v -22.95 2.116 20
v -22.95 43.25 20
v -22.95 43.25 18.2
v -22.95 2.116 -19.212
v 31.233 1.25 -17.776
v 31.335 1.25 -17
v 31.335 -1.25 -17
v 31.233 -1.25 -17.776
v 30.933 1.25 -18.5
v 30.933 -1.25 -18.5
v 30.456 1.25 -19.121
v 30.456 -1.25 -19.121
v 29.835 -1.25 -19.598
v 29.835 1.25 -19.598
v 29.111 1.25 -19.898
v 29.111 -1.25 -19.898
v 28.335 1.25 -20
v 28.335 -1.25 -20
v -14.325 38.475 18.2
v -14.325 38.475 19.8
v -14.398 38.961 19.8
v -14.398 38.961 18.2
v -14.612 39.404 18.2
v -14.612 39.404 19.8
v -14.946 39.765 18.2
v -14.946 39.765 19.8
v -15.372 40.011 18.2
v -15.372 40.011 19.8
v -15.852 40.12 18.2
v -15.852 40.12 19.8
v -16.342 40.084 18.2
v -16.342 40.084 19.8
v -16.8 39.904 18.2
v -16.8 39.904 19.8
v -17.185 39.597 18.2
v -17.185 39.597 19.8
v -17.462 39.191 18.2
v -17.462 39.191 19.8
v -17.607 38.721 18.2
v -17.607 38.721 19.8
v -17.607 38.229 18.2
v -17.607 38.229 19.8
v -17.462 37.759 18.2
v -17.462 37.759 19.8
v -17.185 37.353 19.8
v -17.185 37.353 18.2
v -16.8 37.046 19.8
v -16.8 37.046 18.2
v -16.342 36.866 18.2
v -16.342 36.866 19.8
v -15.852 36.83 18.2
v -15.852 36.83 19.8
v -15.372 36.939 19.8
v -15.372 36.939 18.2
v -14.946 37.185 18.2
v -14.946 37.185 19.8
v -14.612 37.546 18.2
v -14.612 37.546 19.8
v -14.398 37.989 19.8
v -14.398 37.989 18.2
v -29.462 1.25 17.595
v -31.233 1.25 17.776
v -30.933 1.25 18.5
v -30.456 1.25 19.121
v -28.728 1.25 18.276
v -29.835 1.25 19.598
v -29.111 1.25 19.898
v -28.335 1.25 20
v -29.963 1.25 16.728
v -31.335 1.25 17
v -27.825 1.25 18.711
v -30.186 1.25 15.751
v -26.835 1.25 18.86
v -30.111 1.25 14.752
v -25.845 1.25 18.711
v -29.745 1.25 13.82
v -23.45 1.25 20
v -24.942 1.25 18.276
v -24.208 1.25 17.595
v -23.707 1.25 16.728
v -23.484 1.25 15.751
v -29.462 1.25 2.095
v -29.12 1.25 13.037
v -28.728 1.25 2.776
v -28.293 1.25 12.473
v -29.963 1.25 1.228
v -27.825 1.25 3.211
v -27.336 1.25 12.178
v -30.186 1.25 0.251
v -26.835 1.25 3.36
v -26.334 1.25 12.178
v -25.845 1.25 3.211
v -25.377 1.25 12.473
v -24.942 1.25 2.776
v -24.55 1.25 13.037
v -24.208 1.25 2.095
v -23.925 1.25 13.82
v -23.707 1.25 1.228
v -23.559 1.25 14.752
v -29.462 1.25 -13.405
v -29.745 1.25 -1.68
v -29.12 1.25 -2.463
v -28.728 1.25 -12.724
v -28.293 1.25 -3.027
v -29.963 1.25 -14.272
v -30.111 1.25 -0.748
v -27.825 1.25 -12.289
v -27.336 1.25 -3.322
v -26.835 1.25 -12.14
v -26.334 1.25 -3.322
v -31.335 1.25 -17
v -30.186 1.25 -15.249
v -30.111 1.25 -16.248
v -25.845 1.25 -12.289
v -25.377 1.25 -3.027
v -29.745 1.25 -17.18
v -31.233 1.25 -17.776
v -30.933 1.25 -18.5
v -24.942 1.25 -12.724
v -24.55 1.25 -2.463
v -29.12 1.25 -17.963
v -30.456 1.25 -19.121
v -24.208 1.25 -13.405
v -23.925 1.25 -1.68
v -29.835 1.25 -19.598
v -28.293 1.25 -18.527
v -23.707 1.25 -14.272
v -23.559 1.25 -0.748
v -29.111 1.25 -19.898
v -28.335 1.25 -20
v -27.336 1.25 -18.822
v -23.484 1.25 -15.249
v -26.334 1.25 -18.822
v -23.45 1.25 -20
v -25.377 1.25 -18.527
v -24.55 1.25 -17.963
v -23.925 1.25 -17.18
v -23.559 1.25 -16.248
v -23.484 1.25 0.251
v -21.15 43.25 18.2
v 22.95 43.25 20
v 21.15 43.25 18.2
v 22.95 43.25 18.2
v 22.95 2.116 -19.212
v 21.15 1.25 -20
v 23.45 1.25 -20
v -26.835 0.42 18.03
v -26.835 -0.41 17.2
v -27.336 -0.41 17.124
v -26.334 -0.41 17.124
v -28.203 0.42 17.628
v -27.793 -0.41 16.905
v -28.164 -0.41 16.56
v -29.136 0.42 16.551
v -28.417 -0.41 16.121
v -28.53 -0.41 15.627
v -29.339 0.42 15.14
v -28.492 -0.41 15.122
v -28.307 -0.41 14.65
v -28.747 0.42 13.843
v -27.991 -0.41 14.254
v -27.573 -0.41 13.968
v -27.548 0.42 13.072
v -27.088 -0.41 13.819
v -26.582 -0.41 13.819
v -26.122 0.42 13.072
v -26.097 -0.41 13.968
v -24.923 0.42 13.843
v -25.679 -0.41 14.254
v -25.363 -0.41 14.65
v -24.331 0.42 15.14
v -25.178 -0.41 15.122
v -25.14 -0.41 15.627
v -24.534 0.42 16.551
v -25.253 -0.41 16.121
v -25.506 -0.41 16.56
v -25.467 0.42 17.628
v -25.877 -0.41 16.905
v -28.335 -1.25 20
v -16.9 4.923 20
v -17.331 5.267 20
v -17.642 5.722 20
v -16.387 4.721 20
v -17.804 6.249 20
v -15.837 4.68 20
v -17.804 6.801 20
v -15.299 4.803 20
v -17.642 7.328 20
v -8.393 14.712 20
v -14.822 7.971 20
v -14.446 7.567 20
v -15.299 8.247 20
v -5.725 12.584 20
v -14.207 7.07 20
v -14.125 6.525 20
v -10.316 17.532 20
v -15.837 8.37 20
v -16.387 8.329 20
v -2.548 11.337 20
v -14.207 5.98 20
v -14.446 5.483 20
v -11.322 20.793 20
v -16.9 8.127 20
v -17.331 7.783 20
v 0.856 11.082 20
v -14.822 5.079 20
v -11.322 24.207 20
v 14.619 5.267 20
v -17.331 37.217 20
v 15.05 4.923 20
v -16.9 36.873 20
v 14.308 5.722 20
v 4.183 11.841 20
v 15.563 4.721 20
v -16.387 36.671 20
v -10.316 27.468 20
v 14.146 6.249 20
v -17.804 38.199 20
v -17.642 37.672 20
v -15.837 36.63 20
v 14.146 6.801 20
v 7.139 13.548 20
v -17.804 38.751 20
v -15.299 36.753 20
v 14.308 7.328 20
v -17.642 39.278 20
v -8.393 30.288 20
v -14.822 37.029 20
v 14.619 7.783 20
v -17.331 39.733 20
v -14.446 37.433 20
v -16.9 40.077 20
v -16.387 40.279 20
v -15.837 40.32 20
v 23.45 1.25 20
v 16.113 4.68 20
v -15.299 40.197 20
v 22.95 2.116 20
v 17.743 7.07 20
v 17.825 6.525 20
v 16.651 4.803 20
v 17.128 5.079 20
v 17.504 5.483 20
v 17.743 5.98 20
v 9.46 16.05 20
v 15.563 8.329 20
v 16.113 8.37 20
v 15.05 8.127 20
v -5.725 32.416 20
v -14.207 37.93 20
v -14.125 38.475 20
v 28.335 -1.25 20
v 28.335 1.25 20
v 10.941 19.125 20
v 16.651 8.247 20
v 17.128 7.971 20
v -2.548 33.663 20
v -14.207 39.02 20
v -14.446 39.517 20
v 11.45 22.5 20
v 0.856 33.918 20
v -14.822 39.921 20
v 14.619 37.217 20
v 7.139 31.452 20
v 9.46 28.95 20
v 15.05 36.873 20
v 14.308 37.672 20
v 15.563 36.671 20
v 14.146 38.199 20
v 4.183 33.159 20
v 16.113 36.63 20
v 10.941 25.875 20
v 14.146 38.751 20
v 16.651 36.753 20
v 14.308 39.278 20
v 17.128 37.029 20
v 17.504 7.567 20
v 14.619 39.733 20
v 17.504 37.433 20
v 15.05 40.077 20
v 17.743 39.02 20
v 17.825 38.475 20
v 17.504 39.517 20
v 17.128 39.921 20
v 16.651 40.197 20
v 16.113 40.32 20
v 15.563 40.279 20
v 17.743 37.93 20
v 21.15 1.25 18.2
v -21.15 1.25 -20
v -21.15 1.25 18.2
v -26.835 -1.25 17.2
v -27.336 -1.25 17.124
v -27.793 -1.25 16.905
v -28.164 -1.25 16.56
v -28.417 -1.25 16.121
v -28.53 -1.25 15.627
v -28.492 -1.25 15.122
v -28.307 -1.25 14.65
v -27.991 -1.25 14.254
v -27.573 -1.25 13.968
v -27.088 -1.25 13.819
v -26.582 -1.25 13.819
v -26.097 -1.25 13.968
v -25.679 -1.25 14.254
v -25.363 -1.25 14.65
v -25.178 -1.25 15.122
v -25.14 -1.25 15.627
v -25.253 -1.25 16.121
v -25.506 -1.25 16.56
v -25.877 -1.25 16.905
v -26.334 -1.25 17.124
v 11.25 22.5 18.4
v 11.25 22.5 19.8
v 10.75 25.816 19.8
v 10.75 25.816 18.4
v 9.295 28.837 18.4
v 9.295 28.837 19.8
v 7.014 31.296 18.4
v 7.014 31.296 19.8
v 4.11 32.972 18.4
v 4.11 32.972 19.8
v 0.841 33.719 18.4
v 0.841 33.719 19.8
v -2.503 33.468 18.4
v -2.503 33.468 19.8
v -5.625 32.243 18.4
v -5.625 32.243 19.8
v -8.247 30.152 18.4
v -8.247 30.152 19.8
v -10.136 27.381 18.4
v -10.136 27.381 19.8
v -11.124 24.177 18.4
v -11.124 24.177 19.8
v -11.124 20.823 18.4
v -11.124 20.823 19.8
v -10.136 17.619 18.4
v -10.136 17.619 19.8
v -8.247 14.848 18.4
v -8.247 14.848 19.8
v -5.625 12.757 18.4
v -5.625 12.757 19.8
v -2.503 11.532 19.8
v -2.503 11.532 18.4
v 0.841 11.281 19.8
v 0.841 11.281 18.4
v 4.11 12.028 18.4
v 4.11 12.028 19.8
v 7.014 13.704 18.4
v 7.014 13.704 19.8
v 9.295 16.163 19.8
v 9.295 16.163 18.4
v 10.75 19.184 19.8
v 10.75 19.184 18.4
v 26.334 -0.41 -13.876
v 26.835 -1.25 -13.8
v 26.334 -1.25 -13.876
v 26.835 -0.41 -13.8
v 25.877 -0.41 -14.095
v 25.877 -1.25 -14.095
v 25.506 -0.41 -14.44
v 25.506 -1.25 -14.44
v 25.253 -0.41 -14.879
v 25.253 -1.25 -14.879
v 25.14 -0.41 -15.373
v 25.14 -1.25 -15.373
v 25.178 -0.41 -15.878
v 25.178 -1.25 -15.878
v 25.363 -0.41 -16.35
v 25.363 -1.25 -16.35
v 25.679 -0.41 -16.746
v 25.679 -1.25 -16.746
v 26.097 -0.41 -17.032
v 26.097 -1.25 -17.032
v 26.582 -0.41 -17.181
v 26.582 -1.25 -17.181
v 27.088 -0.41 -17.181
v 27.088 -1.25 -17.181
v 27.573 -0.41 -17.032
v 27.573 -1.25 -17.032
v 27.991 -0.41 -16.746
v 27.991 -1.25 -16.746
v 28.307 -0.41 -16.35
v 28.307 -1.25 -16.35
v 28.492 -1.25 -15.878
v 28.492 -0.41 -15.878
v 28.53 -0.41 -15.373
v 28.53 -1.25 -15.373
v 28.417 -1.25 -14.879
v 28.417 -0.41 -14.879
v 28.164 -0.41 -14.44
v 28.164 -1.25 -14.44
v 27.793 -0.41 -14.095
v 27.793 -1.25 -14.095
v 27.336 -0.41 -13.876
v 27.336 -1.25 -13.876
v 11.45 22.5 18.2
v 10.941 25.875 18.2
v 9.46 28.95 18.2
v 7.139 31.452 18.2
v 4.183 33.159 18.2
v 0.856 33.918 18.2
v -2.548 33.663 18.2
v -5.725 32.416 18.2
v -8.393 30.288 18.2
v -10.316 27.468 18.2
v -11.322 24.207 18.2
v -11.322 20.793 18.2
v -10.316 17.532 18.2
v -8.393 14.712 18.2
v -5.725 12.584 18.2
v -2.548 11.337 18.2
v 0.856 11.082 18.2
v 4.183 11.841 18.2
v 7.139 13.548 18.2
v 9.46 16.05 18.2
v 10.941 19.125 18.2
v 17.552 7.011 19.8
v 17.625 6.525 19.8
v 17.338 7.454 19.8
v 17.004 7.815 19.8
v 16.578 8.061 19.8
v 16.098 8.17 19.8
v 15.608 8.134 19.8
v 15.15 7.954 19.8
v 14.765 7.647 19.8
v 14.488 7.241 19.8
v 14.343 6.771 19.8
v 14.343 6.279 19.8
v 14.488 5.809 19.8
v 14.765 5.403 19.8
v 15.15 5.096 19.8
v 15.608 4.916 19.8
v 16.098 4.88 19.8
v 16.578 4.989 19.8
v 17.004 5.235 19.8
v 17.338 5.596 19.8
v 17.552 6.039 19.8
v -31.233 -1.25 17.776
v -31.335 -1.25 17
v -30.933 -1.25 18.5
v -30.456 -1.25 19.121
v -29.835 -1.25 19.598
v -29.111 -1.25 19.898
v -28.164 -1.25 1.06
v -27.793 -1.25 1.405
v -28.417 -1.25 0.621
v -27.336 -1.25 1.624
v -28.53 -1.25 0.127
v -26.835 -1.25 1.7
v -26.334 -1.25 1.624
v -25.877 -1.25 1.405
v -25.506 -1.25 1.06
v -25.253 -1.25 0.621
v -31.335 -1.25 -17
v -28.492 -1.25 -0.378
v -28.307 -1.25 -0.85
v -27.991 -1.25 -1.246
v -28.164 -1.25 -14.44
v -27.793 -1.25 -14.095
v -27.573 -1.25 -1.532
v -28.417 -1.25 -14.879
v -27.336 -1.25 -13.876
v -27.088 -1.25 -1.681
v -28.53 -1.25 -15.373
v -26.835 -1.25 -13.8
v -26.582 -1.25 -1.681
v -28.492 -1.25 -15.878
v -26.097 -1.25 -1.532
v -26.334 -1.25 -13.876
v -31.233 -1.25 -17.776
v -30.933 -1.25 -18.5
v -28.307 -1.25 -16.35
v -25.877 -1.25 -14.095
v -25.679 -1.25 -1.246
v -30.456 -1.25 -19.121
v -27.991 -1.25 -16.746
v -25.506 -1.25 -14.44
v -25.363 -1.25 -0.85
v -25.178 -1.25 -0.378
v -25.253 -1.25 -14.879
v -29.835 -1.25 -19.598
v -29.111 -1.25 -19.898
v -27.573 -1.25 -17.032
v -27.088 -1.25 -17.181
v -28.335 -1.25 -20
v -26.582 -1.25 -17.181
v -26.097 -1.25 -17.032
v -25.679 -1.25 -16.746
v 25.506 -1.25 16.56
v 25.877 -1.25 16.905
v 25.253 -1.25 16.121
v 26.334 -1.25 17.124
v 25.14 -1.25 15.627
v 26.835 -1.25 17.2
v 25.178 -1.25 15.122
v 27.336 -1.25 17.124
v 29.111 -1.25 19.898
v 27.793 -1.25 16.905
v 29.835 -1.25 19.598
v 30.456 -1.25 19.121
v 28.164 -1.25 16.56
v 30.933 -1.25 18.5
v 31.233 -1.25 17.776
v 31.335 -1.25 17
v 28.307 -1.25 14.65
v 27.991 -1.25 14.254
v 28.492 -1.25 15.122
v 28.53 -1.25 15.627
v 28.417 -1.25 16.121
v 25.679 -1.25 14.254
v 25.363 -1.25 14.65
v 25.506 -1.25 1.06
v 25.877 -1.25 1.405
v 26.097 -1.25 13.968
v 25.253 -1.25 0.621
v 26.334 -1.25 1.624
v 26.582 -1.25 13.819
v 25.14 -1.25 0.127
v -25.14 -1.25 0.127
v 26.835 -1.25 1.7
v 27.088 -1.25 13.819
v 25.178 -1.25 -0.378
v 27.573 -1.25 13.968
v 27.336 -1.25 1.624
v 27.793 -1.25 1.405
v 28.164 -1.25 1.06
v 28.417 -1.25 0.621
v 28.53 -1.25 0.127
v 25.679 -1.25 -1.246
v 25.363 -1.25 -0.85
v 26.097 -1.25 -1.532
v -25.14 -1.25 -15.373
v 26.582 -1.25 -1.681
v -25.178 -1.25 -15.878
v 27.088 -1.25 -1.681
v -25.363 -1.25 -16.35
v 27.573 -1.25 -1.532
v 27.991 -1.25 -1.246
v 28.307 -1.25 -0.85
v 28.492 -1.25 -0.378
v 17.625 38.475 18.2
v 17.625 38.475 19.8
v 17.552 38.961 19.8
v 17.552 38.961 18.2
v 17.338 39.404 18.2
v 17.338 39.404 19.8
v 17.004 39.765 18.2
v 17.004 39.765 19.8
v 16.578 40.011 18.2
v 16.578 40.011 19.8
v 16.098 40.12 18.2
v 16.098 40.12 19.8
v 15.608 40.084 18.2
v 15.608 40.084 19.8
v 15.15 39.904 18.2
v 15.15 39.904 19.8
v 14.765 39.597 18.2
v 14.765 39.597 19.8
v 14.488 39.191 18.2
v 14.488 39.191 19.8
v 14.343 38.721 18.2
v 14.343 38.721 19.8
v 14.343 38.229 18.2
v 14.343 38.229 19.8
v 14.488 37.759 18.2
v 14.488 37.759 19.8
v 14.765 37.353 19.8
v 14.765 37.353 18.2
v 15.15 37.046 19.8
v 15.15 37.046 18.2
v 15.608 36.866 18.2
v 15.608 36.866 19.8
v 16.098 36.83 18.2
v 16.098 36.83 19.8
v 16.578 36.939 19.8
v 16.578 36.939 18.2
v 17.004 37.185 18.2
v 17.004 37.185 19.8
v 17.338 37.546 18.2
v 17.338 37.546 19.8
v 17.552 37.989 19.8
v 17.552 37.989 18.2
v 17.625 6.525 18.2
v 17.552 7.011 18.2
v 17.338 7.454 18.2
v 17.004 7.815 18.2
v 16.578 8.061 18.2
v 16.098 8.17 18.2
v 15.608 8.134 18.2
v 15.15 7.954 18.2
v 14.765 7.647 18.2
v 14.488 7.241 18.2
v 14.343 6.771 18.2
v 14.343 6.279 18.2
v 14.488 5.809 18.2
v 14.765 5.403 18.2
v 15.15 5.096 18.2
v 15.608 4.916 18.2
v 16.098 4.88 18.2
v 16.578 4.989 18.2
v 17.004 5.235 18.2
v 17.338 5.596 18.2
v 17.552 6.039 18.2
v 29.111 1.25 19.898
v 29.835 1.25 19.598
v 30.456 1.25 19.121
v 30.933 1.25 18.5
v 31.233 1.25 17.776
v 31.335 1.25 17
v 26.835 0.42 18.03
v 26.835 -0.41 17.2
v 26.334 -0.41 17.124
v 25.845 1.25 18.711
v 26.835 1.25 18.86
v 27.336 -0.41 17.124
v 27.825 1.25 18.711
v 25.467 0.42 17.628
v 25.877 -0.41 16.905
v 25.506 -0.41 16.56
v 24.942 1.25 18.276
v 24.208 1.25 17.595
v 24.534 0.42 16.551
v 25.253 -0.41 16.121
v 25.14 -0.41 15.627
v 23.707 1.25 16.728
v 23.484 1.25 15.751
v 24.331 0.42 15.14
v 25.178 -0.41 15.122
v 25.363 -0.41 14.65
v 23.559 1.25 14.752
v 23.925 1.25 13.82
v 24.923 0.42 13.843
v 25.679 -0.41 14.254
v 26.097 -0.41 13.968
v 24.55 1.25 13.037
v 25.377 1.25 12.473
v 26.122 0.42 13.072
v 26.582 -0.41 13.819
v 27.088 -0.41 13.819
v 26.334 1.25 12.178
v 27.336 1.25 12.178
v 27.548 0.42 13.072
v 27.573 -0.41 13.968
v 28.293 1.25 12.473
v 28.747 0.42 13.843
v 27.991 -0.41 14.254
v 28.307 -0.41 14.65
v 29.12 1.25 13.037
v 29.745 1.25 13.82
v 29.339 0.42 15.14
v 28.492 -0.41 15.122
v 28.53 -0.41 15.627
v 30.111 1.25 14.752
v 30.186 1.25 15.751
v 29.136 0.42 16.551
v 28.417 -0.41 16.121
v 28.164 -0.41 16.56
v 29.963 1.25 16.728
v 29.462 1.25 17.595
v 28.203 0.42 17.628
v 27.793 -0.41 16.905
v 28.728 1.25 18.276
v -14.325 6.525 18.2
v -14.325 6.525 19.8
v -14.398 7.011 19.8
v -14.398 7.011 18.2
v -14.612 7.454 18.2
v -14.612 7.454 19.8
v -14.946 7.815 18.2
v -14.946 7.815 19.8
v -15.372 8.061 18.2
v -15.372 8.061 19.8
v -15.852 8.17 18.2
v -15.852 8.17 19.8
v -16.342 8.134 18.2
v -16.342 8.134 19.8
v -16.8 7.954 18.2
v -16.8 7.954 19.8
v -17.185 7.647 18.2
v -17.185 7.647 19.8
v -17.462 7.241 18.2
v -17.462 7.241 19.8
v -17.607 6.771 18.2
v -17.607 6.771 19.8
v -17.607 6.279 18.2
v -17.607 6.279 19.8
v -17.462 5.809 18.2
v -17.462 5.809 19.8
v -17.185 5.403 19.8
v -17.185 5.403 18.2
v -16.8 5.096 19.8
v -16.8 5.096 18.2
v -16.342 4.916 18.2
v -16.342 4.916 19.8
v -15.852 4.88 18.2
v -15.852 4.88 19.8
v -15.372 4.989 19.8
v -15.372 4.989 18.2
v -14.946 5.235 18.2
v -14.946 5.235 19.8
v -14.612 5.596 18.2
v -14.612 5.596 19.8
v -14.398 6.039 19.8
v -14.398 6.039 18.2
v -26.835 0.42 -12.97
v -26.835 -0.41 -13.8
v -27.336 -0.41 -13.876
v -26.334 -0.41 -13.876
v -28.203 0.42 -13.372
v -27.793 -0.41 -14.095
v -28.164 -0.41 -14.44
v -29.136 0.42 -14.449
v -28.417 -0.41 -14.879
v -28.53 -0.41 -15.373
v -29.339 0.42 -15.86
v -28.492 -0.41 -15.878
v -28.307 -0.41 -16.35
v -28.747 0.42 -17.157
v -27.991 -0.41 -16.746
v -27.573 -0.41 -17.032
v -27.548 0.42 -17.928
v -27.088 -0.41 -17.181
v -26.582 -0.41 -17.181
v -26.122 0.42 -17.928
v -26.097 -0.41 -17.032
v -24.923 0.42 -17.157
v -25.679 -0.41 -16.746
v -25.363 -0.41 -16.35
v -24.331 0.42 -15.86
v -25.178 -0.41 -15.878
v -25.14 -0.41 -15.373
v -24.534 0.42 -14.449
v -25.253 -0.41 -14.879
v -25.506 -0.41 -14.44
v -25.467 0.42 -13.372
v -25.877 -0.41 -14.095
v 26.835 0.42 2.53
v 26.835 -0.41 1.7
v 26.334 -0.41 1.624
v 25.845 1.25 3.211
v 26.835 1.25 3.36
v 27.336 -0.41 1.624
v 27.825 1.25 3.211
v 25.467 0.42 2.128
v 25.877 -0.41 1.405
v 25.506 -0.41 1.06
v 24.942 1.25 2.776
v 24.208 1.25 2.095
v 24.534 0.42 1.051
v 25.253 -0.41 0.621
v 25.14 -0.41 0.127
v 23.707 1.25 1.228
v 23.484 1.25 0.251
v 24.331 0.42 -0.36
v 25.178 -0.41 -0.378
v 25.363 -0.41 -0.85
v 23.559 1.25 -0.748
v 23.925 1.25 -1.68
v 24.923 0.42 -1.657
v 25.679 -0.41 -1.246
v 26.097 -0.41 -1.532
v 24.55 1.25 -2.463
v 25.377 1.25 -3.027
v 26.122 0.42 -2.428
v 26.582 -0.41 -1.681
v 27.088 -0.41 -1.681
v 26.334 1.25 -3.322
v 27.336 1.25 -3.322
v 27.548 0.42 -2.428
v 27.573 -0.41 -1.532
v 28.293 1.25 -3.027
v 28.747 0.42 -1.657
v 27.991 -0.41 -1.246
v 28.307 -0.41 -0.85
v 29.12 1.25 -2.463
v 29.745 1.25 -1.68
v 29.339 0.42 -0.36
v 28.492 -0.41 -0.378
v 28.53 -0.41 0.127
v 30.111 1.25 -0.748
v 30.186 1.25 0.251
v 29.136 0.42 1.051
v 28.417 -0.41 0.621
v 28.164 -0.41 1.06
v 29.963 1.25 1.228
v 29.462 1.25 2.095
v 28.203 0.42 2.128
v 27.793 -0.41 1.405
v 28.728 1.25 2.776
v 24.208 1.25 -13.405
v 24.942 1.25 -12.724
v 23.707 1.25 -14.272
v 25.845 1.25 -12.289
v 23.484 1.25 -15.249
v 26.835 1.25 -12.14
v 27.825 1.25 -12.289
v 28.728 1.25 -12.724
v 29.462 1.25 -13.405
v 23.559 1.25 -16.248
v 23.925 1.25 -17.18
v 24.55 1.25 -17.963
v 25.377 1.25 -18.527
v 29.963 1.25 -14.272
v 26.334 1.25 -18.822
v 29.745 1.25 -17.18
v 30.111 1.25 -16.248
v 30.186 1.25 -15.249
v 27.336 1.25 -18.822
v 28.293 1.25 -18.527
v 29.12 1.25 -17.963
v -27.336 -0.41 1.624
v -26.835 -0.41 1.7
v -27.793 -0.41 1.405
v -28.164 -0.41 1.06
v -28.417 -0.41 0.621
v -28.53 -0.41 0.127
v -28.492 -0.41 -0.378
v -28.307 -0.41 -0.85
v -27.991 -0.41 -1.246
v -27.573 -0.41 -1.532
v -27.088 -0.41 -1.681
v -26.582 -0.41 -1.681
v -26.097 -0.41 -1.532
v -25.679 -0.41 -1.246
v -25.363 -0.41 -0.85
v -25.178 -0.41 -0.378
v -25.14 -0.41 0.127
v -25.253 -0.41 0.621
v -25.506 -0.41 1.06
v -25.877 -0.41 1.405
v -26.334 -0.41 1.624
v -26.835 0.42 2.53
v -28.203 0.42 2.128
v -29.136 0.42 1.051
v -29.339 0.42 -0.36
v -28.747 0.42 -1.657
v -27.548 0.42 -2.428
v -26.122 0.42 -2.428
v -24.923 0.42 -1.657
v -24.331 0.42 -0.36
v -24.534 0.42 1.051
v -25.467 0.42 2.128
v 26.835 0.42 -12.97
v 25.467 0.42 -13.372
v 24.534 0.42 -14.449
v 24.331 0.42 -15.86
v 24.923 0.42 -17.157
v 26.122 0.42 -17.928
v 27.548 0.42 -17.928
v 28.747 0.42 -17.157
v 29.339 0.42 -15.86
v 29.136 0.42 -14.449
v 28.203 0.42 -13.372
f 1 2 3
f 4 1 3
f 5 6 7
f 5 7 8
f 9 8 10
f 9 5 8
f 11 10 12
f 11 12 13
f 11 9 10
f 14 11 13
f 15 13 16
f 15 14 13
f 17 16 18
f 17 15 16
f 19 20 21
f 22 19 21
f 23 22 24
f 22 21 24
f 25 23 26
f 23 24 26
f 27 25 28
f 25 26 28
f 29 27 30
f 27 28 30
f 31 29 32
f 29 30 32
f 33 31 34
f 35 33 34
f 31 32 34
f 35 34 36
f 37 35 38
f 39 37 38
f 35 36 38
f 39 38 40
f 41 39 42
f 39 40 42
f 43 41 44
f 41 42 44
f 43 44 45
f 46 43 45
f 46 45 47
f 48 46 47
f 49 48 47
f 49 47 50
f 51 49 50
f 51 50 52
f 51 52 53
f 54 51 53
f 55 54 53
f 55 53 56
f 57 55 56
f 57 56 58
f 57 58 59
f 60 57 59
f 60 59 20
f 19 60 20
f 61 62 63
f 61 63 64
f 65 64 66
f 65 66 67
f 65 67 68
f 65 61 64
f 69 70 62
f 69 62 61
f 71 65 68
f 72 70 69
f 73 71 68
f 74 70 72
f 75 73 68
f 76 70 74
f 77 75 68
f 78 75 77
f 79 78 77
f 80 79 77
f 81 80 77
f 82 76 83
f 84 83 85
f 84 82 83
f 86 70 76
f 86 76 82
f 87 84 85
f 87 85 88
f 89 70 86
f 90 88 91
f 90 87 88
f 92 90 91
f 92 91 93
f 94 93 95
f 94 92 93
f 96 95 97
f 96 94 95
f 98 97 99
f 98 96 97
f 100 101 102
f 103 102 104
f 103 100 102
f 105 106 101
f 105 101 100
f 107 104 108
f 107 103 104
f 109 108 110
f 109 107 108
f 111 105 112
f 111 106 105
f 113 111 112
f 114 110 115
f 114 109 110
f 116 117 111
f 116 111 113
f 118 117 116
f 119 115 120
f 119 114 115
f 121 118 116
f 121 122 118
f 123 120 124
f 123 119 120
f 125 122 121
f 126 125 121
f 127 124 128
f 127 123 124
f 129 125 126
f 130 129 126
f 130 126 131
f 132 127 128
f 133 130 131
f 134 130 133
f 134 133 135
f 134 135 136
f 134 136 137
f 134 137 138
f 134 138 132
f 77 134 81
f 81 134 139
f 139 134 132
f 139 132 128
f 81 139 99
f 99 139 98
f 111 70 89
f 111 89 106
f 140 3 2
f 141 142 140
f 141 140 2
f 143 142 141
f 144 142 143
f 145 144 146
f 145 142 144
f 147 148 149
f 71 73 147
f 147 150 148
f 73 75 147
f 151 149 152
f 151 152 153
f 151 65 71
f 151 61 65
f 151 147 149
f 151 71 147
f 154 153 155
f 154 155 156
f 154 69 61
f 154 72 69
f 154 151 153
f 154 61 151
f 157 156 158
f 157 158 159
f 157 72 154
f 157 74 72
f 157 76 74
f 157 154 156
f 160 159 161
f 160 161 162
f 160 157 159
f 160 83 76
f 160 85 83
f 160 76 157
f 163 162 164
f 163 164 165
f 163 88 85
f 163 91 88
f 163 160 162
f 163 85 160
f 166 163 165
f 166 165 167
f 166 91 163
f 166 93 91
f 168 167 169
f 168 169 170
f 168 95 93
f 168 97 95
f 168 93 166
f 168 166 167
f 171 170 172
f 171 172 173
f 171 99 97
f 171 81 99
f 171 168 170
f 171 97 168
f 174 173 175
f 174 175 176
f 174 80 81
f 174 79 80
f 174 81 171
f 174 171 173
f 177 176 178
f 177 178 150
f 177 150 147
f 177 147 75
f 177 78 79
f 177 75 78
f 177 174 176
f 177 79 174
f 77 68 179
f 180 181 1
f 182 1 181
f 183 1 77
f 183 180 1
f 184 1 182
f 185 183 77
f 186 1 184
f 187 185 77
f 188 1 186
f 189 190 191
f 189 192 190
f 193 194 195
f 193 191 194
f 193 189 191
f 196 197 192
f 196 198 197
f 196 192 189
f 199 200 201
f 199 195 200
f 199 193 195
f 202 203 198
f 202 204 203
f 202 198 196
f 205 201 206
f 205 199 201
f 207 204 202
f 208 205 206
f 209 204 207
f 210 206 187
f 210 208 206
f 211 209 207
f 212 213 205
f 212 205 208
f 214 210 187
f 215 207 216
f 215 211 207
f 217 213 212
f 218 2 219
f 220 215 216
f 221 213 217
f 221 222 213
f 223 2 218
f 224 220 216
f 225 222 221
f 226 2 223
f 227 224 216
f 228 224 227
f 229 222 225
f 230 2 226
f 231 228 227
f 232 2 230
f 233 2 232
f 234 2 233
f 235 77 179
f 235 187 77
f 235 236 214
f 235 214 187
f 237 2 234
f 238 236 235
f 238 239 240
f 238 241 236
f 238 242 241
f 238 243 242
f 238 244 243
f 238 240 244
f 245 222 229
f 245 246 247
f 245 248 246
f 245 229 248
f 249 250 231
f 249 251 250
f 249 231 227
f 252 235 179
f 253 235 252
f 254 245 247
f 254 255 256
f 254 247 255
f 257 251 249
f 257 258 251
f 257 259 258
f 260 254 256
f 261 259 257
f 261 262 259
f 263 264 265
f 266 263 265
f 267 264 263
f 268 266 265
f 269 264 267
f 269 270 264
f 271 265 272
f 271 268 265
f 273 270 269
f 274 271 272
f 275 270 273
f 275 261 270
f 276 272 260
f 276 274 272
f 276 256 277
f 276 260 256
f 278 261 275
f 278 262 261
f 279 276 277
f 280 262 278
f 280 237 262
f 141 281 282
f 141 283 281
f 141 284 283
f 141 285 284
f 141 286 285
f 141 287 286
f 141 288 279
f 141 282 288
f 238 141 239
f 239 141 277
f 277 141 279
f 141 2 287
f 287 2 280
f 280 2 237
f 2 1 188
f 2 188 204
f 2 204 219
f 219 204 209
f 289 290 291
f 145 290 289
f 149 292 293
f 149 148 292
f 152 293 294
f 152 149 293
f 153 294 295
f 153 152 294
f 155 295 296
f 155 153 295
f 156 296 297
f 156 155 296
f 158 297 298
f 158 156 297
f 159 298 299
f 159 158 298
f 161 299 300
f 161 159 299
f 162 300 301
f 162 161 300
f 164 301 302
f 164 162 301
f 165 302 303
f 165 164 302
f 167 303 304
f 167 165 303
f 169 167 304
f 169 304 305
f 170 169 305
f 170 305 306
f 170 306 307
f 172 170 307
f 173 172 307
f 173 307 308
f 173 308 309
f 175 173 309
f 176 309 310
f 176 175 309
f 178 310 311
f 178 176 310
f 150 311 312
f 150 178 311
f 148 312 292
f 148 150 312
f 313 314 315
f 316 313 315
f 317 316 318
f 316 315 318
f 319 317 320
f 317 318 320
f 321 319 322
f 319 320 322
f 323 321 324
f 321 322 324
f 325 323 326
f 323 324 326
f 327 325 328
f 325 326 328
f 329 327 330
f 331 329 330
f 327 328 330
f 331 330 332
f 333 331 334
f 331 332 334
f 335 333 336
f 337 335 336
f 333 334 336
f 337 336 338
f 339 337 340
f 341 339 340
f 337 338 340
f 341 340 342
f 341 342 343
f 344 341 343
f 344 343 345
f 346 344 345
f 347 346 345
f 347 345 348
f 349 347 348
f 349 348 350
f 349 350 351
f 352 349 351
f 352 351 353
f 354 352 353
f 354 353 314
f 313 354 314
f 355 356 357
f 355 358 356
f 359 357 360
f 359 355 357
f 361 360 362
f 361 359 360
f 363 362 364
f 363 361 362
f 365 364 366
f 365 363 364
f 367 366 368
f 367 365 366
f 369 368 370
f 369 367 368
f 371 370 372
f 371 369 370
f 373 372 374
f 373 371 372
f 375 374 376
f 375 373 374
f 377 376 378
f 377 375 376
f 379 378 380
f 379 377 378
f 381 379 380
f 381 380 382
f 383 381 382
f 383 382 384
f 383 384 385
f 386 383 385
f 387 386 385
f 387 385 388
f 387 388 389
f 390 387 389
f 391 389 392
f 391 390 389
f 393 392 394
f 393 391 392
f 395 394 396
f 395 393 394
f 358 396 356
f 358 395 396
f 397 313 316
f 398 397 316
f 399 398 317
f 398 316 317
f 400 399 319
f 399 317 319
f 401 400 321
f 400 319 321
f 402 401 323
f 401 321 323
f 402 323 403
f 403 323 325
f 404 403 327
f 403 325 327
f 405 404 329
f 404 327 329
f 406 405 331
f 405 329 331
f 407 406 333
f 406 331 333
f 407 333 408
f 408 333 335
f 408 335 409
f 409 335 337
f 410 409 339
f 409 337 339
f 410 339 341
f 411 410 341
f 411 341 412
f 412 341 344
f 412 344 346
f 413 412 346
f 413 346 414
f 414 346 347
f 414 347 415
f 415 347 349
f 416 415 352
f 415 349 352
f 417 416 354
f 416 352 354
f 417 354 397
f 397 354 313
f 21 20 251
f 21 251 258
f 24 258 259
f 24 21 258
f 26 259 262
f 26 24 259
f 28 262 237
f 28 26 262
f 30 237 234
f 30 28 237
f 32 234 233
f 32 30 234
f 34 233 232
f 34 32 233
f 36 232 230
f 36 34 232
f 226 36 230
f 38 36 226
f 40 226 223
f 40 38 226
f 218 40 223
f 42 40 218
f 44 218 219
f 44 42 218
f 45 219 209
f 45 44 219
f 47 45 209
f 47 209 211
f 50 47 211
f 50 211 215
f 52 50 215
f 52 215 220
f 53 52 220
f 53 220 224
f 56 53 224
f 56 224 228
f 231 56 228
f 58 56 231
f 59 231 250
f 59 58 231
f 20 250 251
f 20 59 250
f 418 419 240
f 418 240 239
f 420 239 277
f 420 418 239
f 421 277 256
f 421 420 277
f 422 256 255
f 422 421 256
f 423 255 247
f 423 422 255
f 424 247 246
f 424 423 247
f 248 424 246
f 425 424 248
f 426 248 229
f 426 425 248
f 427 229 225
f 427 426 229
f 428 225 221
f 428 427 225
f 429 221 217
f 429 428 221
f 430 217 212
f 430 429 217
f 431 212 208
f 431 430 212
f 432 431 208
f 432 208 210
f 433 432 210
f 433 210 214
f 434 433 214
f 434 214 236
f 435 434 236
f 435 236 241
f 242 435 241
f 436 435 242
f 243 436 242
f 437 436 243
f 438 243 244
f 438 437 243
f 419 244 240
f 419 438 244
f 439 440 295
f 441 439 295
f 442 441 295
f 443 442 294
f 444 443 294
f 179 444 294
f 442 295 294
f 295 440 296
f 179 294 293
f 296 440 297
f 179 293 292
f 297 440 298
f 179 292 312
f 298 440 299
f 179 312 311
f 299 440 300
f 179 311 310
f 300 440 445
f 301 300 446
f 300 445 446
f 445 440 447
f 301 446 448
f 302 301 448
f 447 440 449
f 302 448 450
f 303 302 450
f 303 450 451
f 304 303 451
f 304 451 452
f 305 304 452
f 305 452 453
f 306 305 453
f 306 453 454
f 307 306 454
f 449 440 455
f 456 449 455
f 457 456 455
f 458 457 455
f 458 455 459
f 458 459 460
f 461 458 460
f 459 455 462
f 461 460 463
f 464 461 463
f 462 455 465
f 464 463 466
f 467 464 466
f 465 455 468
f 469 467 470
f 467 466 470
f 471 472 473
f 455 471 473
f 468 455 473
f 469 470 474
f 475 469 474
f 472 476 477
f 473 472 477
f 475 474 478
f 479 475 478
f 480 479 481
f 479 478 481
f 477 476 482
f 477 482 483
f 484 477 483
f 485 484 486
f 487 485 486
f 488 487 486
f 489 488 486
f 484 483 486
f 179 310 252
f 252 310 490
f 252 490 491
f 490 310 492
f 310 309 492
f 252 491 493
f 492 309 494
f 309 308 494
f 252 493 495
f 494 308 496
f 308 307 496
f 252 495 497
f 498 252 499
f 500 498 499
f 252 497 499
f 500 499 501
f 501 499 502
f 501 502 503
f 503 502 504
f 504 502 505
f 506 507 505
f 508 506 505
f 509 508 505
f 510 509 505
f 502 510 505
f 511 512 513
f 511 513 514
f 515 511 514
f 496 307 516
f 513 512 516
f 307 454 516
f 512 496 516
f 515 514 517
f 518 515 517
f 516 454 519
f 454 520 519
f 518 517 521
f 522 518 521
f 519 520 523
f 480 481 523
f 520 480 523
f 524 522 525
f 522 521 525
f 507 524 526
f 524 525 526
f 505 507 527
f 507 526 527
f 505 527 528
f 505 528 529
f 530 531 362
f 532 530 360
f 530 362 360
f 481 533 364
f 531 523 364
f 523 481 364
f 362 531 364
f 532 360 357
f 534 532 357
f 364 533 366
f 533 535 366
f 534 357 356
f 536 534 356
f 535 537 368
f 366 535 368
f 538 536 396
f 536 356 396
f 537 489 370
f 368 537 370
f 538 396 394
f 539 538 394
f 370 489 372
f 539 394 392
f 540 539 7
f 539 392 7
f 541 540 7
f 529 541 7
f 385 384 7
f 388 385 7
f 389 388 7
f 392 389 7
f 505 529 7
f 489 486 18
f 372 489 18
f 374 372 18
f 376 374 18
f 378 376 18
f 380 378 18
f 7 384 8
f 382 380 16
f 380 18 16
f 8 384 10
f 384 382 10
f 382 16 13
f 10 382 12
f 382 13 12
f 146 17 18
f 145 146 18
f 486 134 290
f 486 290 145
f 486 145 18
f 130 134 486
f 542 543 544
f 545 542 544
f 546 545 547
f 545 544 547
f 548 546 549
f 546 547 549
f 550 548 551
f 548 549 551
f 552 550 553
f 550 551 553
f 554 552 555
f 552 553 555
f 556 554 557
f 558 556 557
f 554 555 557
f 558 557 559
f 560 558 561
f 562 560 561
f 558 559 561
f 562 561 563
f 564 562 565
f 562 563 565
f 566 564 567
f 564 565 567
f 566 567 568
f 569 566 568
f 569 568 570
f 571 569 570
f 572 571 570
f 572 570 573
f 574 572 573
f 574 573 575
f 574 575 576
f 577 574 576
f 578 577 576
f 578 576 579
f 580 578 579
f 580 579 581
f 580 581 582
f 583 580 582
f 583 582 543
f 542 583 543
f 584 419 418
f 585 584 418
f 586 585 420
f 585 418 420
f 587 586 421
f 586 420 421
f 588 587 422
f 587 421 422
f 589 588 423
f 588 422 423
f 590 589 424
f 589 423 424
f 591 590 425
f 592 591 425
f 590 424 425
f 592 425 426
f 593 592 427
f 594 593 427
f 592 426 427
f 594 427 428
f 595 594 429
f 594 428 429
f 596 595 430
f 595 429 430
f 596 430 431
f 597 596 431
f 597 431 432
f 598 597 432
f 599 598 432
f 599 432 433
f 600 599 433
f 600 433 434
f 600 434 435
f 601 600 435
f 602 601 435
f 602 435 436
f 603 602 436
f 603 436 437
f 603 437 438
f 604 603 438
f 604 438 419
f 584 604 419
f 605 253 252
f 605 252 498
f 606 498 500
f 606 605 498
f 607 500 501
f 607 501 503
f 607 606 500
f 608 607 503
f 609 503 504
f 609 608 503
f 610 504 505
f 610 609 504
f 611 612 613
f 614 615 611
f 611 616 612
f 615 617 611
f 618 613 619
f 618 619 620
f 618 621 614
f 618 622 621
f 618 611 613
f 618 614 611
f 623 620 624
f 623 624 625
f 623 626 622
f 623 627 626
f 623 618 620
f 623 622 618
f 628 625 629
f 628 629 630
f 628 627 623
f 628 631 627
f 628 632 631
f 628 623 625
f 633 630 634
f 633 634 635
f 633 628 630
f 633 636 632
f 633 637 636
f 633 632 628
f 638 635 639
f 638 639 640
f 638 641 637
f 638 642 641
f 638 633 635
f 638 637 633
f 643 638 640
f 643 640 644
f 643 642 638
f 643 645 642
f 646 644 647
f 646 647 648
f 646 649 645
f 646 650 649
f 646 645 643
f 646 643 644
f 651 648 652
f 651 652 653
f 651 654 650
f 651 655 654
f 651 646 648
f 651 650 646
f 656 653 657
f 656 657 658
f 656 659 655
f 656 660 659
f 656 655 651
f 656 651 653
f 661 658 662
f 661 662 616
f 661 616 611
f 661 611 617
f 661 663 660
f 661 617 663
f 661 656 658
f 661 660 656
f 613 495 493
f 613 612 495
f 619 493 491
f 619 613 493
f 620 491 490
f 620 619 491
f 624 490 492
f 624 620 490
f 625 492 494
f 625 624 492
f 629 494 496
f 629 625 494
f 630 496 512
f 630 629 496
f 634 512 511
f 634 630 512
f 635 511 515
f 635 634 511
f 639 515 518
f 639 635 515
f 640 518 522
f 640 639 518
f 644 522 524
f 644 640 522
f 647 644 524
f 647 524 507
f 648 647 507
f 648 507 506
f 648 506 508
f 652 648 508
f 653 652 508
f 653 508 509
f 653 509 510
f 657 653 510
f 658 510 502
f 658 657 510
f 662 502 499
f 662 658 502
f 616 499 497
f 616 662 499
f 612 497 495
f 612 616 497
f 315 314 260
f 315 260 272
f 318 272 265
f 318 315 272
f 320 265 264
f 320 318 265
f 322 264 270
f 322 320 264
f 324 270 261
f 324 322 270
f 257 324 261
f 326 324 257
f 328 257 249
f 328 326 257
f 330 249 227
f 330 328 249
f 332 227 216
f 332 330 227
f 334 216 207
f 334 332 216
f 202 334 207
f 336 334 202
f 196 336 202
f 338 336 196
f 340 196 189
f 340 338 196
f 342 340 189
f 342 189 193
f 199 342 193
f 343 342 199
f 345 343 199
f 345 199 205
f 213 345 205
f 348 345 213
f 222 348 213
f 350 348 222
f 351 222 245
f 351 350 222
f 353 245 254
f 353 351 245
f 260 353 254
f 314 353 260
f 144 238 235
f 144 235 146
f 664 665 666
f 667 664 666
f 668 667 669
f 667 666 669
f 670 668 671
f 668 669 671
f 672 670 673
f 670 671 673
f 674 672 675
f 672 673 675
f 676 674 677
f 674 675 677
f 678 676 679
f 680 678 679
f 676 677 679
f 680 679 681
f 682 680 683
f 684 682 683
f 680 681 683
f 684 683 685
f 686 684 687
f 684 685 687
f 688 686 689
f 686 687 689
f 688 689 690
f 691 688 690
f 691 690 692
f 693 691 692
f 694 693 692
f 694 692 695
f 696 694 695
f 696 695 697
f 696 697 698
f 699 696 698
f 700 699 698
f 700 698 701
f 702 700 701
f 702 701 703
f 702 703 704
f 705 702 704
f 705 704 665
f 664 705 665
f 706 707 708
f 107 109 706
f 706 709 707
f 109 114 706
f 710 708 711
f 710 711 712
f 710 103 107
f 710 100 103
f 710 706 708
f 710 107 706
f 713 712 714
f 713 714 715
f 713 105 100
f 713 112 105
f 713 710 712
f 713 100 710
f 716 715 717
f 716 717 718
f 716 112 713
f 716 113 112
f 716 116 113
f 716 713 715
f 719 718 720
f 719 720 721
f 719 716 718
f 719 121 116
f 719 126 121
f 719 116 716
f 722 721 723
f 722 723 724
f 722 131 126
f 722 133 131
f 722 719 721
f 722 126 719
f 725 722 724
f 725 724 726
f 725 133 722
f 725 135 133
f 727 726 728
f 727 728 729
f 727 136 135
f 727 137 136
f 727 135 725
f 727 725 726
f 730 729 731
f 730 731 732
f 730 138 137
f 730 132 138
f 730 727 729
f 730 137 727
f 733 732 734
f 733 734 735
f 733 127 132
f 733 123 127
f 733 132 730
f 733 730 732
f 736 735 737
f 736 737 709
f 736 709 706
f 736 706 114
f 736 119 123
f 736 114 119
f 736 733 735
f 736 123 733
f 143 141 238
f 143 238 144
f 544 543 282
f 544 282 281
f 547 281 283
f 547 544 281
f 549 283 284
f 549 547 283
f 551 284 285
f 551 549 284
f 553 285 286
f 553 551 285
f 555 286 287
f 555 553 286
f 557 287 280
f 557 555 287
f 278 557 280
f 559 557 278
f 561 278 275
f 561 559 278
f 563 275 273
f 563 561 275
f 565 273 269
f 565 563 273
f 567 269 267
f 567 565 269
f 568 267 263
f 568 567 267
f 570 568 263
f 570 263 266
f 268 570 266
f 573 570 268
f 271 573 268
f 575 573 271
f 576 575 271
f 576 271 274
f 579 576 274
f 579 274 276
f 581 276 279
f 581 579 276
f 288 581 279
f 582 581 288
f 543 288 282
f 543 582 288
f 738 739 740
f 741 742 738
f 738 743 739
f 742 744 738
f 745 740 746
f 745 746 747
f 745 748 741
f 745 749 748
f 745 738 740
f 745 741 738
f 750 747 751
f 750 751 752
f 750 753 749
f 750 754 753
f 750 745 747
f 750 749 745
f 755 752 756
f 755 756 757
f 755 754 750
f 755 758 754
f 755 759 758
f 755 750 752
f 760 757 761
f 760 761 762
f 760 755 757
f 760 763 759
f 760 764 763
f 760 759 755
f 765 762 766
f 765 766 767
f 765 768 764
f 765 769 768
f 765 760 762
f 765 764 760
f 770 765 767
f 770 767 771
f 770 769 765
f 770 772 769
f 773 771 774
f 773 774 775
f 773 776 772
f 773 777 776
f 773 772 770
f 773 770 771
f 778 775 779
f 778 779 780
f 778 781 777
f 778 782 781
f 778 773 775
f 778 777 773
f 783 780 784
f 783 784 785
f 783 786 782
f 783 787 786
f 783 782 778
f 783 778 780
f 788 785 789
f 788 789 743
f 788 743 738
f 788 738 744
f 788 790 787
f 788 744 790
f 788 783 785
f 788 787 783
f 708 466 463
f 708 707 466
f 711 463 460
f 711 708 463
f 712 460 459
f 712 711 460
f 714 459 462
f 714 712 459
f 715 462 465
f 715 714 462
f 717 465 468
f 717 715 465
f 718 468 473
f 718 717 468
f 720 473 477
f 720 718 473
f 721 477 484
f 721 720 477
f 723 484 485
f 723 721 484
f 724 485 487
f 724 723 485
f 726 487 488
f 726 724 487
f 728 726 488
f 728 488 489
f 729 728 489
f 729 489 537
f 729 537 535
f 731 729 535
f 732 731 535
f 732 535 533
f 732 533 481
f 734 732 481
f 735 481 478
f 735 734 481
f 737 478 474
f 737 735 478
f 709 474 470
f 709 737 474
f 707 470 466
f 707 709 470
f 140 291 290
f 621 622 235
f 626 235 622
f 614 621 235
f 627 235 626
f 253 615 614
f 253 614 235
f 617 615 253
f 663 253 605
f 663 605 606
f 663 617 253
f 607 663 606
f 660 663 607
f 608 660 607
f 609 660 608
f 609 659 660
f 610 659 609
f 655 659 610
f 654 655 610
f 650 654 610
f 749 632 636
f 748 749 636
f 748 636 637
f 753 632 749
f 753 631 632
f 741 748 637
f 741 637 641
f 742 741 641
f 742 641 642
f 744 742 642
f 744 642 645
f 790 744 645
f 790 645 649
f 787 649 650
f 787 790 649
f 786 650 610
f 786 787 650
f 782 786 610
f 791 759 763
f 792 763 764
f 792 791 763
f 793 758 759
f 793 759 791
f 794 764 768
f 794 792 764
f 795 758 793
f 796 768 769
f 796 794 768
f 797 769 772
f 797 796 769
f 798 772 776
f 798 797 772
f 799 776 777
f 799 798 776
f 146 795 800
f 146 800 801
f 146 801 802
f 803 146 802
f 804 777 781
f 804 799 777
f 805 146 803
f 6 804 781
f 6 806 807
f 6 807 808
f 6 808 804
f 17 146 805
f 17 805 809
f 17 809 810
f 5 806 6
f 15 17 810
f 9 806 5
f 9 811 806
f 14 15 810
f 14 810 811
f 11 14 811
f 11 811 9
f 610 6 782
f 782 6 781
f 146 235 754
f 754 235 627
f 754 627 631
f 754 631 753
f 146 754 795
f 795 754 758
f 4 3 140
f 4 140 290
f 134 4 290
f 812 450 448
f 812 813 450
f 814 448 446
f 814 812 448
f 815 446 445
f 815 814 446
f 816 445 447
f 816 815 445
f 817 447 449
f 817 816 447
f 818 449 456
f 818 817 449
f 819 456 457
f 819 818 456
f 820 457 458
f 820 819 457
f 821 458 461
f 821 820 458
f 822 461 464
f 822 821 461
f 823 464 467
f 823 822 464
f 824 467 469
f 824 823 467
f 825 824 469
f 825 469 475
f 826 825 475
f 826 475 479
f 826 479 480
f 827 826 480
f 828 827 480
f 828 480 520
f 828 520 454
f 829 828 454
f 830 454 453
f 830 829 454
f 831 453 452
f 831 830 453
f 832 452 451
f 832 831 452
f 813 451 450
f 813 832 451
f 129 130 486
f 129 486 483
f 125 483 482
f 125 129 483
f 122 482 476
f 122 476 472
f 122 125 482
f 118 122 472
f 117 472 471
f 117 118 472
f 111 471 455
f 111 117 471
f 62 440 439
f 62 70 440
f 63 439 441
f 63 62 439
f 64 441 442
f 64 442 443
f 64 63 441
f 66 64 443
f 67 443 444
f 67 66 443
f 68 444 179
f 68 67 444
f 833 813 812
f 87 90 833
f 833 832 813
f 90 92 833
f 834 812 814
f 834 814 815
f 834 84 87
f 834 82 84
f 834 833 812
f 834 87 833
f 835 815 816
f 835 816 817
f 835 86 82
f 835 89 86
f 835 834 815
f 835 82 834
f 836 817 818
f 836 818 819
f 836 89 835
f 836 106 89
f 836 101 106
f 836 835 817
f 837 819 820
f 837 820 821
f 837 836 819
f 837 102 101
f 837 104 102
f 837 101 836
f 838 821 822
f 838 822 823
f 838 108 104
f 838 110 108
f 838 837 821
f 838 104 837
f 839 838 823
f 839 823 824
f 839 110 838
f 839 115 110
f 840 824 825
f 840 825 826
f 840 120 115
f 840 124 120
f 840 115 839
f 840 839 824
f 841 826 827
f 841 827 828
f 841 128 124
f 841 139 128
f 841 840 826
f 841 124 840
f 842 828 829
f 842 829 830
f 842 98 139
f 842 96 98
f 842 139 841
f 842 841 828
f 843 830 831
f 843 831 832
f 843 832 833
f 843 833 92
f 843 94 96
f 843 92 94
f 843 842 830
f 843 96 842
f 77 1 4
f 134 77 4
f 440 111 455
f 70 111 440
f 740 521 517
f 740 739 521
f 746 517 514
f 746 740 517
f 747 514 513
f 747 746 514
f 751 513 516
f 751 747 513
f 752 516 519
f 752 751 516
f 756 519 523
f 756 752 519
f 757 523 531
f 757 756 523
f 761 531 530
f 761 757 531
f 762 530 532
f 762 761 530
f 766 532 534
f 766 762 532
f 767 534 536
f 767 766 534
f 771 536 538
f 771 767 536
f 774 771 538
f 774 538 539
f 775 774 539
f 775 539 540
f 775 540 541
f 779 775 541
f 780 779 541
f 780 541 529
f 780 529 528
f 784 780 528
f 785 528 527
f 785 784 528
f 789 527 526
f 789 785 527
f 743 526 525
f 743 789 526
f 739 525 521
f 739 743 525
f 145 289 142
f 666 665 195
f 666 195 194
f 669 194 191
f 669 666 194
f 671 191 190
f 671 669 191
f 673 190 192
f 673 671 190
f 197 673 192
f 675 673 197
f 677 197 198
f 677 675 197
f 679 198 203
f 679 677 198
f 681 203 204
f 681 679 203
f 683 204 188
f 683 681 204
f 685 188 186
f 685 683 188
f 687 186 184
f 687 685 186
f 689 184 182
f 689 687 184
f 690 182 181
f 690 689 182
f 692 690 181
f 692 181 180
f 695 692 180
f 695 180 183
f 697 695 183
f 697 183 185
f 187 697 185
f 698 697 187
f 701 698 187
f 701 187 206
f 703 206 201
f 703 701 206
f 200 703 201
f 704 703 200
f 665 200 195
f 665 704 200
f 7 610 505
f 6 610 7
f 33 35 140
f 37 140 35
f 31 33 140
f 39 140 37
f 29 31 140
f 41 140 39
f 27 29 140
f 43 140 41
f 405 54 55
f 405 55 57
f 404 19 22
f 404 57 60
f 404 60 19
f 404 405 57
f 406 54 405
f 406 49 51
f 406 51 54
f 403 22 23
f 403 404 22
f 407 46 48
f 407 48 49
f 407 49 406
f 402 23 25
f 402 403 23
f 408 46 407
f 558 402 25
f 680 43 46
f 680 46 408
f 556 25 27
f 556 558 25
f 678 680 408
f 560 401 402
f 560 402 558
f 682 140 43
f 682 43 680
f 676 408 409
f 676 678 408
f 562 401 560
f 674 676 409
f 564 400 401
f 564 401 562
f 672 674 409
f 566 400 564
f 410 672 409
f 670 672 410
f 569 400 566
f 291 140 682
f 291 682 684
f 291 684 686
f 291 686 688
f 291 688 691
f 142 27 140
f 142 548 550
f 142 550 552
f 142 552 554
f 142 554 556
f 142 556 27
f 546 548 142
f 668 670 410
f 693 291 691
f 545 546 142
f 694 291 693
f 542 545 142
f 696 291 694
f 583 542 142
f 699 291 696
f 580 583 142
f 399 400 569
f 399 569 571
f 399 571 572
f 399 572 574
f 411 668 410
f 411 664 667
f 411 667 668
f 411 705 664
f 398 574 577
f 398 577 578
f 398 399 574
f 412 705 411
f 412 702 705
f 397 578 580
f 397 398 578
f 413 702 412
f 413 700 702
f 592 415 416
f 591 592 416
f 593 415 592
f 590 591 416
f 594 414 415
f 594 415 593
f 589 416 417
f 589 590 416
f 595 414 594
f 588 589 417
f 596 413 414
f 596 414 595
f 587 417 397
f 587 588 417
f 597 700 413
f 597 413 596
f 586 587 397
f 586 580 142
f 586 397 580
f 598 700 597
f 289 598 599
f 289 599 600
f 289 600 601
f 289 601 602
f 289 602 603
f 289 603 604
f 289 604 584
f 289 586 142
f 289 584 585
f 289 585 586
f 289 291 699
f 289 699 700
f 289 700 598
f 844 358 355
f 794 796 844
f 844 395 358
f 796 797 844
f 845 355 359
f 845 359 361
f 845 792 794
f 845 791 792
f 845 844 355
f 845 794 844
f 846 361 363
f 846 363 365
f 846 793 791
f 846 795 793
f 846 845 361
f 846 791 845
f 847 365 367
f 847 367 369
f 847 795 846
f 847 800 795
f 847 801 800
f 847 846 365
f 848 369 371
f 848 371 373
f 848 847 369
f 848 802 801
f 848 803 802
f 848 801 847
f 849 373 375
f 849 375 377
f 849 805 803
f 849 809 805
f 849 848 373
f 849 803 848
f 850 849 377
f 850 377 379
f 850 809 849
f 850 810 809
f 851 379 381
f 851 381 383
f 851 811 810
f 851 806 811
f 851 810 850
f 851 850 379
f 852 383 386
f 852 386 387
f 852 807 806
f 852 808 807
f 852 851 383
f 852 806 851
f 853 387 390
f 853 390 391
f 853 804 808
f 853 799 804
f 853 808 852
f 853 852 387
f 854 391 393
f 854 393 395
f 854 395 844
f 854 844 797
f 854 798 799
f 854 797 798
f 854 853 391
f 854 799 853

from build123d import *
from OCP.BRepFilletAPI import BRepFilletAPI_MakeChamfer

# Parameters (mm, degrees)
RESSALTO_EXTRUS_O1_DEPTH            = 1.25
ESBO_O2_W                           = 45.9
ESBO_O2_H                           = 40
ESBO_O2_W_2                         = 42.3
ESBO_O2_H_2                         = 36.4
RESSALTO_EXTRUS_O2_DEPTH            = 42
CORTE_EXTRUS_O1_DEPTH               = 58.030208881
CORTE_EXTRUS_O1_DEPTH_BACK          = 58.030208881
ESBO_O5_R                           = 11.25
CORTE_EXTRUS_O2_DEPTH               = 67.726641793
ESBO_O6_R                           = 1.65
CORTE_EXTRUS_O3_DEPTH               = 67.726641793
ESBO_O7_W                           = 42.3
ESBO_O7_H                           = 1.8
CORTE_EXTRUS_O4_DEPTH               = 57.08816475
ESCAREADO_PARA_SFHCS_M31_AT_2_COUNT = 2
ESCAREADO_PARA_SFHCS_M31_AT_2_PITCH = 15.5
ESCAREADO_PARA_SFHCS_M31_AT_3_COUNT = 2
ESCAREADO_PARA_SFHCS_M31_AT_3_PITCH = 15.5
ESCAREADO_PARA_SFHCS_M31_AT_4_COUNT = 2
ESCAREADO_PARA_SFHCS_M31_AT_4_PITCH = 55.863394992
ESCAREADO_PARA_SFHCS_M31_AT_5_COUNT = 2
ESCAREADO_PARA_SFHCS_M31_AT_5_PITCH = 53.67
ESCAREADO_PARA_SFHCS_M31_AT_6_COUNT = 2
ESCAREADO_PARA_SFHCS_M31_AT_6_PITCH = 55.863394992
CHANFRO1_SIZE                       = 0.5
CHANFRO1_SIZE2                      = 0.866025404
CHANFRO2_SIZE                       = 0.2


with BuildPart() as part:
    # Esboço1 → Ressalto-extrusão1 (new, symmetric)
    with BuildSketch(Plane(origin=(0, 0, 0), x_dir=(1, 0, 0), z_dir=(0, 1, 0))):
        with BuildLine():
            Line((-28.335, -20), (28.335, -20))
            ThreePointArc((28.335, -20), (30.456320344, -19.121320344), (31.335, -17))
            Line((31.335, -17), (31.335, 17))
            ThreePointArc((31.335, 17), (30.456320344, 19.121320344), (28.335, 20))
            Line((28.335, 20), (-28.335, 20))
            ThreePointArc((-28.335, 20), (-30.456320344, 19.121320344), (-31.335, 17))
            Line((-31.335, 17), (-31.335, -17))
            ThreePointArc((-31.335, -17), (-30.456320344, -19.121320344), (-28.335, -20))
        make_face()
    extrude(amount=RESSALTO_EXTRUS_O1_DEPTH, both=True)

    # Esboço2 → Ressalto-extrusão2 (add)
    with BuildSketch(Plane(origin=(0, 1.25, 0), x_dir=(1, 0, 0), z_dir=(0, 1, 0))):
        Rectangle(ESBO_O2_W, ESBO_O2_H)
        Rectangle(ESBO_O2_W_2, ESBO_O2_H_2, mode=Mode.SUBTRACT)
    extrude(amount=RESSALTO_EXTRUS_O2_DEPTH)

    # Esboço4 → Corte-extrusão1 (cut, two sides: drawn at the far end of the back side and taken through both)
    with BuildSketch(Plane(origin=(0, 0, 0), x_dir=(0, 0, -1), z_dir=(1, 0, 0)).offset(-CORTE_EXTRUS_O1_DEPTH_BACK)):
        Polygon((-18.2, 43.25), (20, 1.25), (20, 43.25), align=None)
    extrude(amount=CORTE_EXTRUS_O1_DEPTH + CORTE_EXTRUS_O1_DEPTH_BACK, mode=Mode.SUBTRACT)

    # Esboço5 → Corte-extrusão2 (cut, through all)
    with BuildSketch(Plane.XY.offset(20)):
        with Locations((0, 22.5)):
            Circle(ESBO_O5_R)
    extrude(amount=-CORTE_EXTRUS_O2_DEPTH, mode=Mode.SUBTRACT)

    # Esboço6 → Corte-extrusão3 (cut, through all)
    with BuildSketch(Plane.XY.offset(20)):
        with Locations((-15.975, 38.475)):
            Circle(ESBO_O6_R)
        with Locations((15.975, 38.475)):
            Circle(ESBO_O6_R)
        with Locations((15.975, 6.525)):
            Circle(ESBO_O6_R)
        with Locations((-15.975, 6.525)):
            Circle(ESBO_O6_R)
    extrude(amount=-CORTE_EXTRUS_O3_DEPTH, mode=Mode.SUBTRACT)

    # Esboço7 → Corte-extrusão4 (cut, through all)
    with BuildSketch(Plane(origin=(0, 1.25, 0), x_dir=(1, 0, 0), z_dir=(0, 1, 0))):
        with Locations((0, 19.1)):
            Rectangle(ESBO_O7_W, ESBO_O7_H)
    extrude(amount=CORTE_EXTRUS_O4_DEPTH, mode=Mode.SUBTRACT)

    # Esboço9 → Escareado para SFHCS M31 (revolve, cut)
    with BuildSketch(Plane(origin=(-26.835, 1.25, 0), x_dir=(0, 0, 1), z_dir=(1, 0, 0))):
        Polygon((0, 0), (0, 2.5), (1.7, 2.5), (1.7, 1.66), (3.36, 0), align=None)
    escareado_para_sfhcs_m31 = revolve(axis=Axis((-26.835, 7.6, 0), (0, -1, 0)), mode=Mode.SUBTRACT)

    # Escareado para SFHCS M31 at 2: Escareado para SFHCS M31 ×2
    with Locations(*[(0, 0, i * ESCAREADO_PARA_SFHCS_M31_AT_2_PITCH) for i in range(1, ESCAREADO_PARA_SFHCS_M31_AT_2_COUNT)]):
        add(escareado_para_sfhcs_m31, mode=Mode.SUBTRACT)

    # Escareado para SFHCS M31 at 3: Escareado para SFHCS M31 ×2
    with Locations(*[(0, 0, -i * ESCAREADO_PARA_SFHCS_M31_AT_3_PITCH) for i in range(1, ESCAREADO_PARA_SFHCS_M31_AT_3_COUNT)]):
        add(escareado_para_sfhcs_m31, mode=Mode.SUBTRACT)

    # Escareado para SFHCS M31 at 4: Escareado para SFHCS M31 ×2
    with Locations(*[Vector(0.9607364537719713, 0, -0.2774625495335487) * (i * ESCAREADO_PARA_SFHCS_M31_AT_4_PITCH) for i in range(1, ESCAREADO_PARA_SFHCS_M31_AT_4_COUNT)]):
        add(escareado_para_sfhcs_m31, mode=Mode.SUBTRACT)

    # Escareado para SFHCS M31 at 5: Escareado para SFHCS M31 ×2
    with Locations(*[(i * ESCAREADO_PARA_SFHCS_M31_AT_5_PITCH, 0, 0) for i in range(1, ESCAREADO_PARA_SFHCS_M31_AT_5_COUNT)]):
        add(escareado_para_sfhcs_m31, mode=Mode.SUBTRACT)

    # Escareado para SFHCS M31 at 6: Escareado para SFHCS M31 ×2
    with Locations(*[Vector(0.9607364537719713, 0, 0.2774625495335487) * (i * ESCAREADO_PARA_SFHCS_M31_AT_6_PITCH) for i in range(1, ESCAREADO_PARA_SFHCS_M31_AT_6_COUNT)]):
        add(escareado_para_sfhcs_m31, mode=Mode.SUBTRACT)

    # Chanfro1: one chamfer whose edges measure the first distance from different faces: ONE call of the kernel's chamfer builder (chamfer() names one face for all edges)
    chanfro1_edges_1 = [part.edges().sort_by_distance(p)[0] for p in [
        (-22.95, 1.25, 0),
    ]]
    chanfro1_side_1 = [part.faces().sort_by_distance(p)[0] for p in [
        (-30.167330013, 1.25, 18.832330013),
    ]]
    chanfro1_edges_2 = [part.edges().sort_by_distance(p)[0] for p in [
        (22.95, 1.25, 0),
    ]]
    chanfro1_side_2 = [part.faces().sort_by_distance(p)[0] for p in [
        (23.358694045, 1.25, 0),
    ]]
    chanfro1 = BRepFilletAPI_MakeChamfer(part.part.solid().wrapped)
    for e in chanfro1_edges_1:
        chanfro1.Add(CHANFRO1_SIZE, CHANFRO1_SIZE2, e.wrapped, chanfro1_side_1[0].wrapped)  # the first distance lies on this face
    for e in chanfro1_edges_2:
        chanfro1.Add(CHANFRO1_SIZE, CHANFRO1_SIZE2, e.wrapped, chanfro1_side_2[0].wrapped)  # the first distance lies on this face
    add(Compound.cast(chanfro1.Shape()), mode=Mode.REPLACE)

    # Chanfro2
    chanfro2_edges = [part.edges().sort_by_distance(p)[0] for p in [
        (-11.25, 22.5, 18.2),
        (-11.25, 22.5, 20),
        (-17.625, 6.525, 20),
        (14.325, 6.525, 20),
        (14.325, 38.475, 20),
        (-17.625, 38.475, 20),
    ]]
    chamfer(chanfro2_edges, length=CHANFRO2_SIZE)


solid = part.part
